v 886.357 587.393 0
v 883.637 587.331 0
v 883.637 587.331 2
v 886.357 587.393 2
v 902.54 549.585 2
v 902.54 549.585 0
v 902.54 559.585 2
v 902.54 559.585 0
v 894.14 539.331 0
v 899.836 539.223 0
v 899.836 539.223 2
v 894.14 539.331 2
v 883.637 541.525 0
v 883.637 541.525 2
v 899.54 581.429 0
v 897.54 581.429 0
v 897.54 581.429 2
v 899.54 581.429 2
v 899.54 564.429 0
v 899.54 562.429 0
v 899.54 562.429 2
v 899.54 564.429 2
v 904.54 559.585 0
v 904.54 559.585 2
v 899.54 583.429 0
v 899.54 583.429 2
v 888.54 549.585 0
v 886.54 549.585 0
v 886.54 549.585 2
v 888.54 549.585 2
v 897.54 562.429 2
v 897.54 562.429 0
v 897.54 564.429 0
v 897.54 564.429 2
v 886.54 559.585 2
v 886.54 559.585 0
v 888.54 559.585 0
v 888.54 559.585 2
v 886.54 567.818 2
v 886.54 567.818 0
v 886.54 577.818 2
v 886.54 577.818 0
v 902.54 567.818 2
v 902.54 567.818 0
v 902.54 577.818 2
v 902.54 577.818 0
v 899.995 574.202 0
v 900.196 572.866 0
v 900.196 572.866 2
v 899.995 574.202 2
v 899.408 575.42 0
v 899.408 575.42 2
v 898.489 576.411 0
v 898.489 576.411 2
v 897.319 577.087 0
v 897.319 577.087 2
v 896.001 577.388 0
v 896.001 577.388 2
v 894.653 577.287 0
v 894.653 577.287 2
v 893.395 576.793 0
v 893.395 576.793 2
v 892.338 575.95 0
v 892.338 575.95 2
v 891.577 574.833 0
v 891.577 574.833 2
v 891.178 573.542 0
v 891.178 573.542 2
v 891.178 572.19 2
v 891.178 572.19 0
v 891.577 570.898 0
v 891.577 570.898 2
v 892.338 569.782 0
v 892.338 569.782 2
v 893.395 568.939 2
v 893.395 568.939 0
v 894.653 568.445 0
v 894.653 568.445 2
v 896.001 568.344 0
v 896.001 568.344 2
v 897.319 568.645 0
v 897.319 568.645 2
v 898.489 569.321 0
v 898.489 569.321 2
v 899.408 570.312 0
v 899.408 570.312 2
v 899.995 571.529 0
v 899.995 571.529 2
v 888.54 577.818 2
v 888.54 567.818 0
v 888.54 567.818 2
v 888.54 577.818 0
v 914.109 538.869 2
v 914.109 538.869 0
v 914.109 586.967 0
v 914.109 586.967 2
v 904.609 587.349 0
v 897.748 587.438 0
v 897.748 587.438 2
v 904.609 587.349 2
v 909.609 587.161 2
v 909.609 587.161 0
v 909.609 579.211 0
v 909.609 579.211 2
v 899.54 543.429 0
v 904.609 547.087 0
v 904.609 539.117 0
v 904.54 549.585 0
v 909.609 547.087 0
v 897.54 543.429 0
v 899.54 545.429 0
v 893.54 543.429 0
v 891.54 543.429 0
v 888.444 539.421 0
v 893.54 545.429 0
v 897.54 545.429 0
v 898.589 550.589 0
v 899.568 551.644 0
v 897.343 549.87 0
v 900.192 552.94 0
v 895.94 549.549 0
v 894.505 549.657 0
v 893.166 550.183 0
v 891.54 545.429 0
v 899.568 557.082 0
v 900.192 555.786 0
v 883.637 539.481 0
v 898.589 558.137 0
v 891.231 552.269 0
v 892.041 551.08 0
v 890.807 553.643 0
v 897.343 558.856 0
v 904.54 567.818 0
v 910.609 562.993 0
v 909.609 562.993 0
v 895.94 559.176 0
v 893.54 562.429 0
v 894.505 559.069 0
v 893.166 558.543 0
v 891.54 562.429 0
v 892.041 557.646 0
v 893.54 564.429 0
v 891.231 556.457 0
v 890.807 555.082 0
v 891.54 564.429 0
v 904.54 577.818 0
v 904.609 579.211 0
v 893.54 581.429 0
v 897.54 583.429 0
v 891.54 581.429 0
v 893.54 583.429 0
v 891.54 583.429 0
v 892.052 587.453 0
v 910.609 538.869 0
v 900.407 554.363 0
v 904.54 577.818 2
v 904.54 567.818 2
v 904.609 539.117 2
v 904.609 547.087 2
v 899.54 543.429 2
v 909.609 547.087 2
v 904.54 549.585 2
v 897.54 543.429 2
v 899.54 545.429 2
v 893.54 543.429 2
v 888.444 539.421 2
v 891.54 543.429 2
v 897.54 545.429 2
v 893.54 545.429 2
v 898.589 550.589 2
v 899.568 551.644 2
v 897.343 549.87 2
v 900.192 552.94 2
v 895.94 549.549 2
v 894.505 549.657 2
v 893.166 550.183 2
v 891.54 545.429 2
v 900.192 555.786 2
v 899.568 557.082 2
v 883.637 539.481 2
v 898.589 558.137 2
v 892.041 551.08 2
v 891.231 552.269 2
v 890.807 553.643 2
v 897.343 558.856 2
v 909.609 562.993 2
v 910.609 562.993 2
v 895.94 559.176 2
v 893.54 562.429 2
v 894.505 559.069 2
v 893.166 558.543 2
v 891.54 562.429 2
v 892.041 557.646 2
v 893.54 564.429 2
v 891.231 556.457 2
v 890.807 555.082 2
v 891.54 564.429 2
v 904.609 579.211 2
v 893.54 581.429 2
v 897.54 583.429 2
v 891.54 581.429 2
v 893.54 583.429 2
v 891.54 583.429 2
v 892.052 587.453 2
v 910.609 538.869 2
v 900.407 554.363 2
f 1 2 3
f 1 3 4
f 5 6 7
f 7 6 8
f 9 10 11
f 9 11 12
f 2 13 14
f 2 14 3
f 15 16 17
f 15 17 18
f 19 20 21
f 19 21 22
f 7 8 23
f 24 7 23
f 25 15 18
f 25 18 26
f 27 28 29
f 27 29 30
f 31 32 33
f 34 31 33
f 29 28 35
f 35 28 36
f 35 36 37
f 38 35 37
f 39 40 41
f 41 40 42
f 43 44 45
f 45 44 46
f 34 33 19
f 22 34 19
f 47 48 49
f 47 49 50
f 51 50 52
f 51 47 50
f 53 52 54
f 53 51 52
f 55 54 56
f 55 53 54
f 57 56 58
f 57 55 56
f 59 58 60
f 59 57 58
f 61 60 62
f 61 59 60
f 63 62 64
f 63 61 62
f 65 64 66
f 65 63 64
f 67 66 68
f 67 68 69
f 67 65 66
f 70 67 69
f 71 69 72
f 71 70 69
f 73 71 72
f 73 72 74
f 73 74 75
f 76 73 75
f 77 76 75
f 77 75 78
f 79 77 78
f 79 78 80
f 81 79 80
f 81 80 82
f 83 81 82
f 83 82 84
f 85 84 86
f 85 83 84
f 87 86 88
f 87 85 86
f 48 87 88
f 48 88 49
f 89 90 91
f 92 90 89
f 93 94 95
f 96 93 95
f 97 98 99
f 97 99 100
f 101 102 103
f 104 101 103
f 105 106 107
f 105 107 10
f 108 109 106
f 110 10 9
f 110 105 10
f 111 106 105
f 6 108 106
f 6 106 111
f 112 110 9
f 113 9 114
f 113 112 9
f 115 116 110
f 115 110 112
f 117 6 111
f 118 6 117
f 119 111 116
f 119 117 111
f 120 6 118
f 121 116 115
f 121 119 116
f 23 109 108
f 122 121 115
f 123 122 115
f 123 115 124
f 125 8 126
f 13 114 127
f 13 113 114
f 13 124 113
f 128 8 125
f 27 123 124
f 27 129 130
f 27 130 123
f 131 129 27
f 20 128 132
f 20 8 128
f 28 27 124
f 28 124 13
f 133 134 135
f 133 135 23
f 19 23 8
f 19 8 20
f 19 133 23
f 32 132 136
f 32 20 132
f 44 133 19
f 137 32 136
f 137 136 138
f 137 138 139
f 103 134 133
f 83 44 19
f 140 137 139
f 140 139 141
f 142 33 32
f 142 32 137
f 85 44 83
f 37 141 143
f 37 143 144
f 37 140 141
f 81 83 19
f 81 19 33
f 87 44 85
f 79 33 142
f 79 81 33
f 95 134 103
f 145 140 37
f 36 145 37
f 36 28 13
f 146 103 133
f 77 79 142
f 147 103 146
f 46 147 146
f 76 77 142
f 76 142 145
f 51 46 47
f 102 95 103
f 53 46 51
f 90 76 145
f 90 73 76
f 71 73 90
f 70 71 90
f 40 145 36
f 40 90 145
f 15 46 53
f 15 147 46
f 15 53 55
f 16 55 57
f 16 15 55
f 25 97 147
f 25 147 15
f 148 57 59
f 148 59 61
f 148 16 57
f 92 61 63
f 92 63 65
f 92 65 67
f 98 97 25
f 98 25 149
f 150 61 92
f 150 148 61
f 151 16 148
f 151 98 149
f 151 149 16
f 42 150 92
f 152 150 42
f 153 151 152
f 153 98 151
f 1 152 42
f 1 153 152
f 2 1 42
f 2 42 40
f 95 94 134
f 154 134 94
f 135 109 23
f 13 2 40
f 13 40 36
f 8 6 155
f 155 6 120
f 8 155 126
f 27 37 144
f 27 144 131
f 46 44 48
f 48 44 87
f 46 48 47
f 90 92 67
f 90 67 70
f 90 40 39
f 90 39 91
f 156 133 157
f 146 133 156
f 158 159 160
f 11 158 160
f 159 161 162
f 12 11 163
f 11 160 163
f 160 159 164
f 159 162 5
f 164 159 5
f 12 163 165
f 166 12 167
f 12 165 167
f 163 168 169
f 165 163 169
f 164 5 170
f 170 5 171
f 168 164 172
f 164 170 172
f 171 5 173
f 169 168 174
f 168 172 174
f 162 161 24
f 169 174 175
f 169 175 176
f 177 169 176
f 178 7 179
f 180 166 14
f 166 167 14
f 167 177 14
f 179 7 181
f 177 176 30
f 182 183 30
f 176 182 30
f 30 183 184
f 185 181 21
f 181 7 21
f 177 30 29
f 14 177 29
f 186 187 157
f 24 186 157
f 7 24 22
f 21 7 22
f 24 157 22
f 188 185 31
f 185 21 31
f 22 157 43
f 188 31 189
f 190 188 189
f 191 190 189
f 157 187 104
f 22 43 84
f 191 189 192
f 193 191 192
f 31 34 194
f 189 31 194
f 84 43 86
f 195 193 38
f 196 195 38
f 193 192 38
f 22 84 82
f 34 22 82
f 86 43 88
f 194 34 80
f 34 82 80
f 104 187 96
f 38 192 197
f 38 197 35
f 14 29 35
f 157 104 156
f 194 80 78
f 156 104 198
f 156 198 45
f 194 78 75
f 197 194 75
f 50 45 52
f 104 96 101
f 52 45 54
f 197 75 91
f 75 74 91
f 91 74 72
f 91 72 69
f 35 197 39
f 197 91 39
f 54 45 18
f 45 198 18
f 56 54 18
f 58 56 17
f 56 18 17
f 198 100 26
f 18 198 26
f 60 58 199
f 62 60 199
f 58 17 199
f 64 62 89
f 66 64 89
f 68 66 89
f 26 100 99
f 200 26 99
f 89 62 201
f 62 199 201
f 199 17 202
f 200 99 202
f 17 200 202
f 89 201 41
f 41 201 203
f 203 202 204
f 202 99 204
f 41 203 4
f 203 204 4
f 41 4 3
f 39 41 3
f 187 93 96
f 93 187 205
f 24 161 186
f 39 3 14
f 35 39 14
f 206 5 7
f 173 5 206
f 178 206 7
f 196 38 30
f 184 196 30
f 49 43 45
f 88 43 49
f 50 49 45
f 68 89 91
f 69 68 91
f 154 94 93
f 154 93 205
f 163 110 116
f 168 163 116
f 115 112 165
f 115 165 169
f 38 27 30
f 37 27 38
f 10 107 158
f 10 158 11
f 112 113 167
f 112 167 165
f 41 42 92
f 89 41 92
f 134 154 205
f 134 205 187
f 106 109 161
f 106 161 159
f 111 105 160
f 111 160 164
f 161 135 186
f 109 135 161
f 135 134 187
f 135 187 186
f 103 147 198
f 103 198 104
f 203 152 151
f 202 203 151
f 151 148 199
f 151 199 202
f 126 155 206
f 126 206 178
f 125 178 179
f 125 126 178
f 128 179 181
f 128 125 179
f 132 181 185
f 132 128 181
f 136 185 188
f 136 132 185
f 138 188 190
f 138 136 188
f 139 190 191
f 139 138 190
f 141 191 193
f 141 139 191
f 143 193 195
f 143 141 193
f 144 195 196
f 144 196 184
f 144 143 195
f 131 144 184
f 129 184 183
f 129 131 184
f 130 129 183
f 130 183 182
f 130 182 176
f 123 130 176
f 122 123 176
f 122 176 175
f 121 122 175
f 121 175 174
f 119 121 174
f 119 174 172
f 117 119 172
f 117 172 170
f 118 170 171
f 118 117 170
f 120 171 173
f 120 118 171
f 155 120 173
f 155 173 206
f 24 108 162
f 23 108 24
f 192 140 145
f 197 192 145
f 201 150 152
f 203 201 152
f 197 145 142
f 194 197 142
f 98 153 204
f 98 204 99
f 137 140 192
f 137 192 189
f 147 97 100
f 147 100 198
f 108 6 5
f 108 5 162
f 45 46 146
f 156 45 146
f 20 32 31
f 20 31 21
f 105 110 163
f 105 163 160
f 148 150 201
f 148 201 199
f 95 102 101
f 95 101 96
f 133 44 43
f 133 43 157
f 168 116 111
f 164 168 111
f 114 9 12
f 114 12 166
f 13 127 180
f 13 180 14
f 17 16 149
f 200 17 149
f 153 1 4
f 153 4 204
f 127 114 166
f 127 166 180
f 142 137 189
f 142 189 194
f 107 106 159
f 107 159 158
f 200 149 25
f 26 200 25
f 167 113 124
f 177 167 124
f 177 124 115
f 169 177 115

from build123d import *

# Parameters (mm, degrees)
MODEL_R         = 4.534410691
MODEL_R_2       = 4.826928656
MODEL_W         = 2
MODEL_H         = 10
MODEL_H_2       = 2
EXTRUDE_1_DEPTH = 2


with BuildPart() as part:
    # Model → 凸台-拉伸1 (new body)
    with BuildSketch(Plane.XY):
        Polygon((883.637204973, 587.330530622), (886.356553012, 587.393355998), (892.052378601, 587.452861056), (897.748434881, 587.438305688), (904.608822678, 587.348603606), (904.608822678, 579.211202345), (909.608822678, 579.211202345), (909.608822678, 580.211202345), (909.608822678, 587.161390594), (914.108822678, 586.966954635), (914.108822678, 579.859457913), (914.108822678, 538.869007346), (910.608822678, 538.869007346), (910.608822678, 562.993038329), (909.608822678, 562.993038329), (909.608822678, 547.086608467), (904.608822678, 547.086608467), (904.608822678, 539.117249216), (899.835523647, 539.223453365), (894.140406006, 539.331138315), (888.444075417, 539.420753158), (883.636881049, 539.481070293), (883.637204973, 541.525037946), align=None)
        with Locations((895.661921161, 572.865848158)):
            Circle(MODEL_R, mode=Mode.SUBTRACT)
        with Locations((895.579584436, 554.362843803)):
            Circle(MODEL_R_2, mode=Mode.SUBTRACT)
        with Locations((887.540358452, 554.584784532)):
            Rectangle(MODEL_W, MODEL_H, mode=Mode.SUBTRACT)
        with Locations((887.540358452, 572.817915241)):
            Rectangle(MODEL_W, MODEL_H, mode=Mode.SUBTRACT)
        with Locations((903.540358452, 572.817915241)):
            Rectangle(MODEL_W, MODEL_H, mode=Mode.SUBTRACT)
        with Locations((903.540358452, 554.584784532)):
            Rectangle(MODEL_W, MODEL_H, mode=Mode.SUBTRACT)
        with Locations((898.540358452, 544.428876798)):
            Rectangle(MODEL_W, MODEL_H_2, mode=Mode.SUBTRACT)
        with Locations((892.540358452, 544.428876798)):
            Rectangle(MODEL_W, MODEL_H_2, mode=Mode.SUBTRACT)
        with Locations((898.540358452, 563.428876798)):
            Rectangle(MODEL_W, MODEL_H_2, mode=Mode.SUBTRACT)
        with Locations((892.540358452, 563.428876798)):
            Rectangle(MODEL_W, MODEL_H_2, mode=Mode.SUBTRACT)
        with Locations((898.540358452, 582.428876798)):
            Rectangle(MODEL_W, MODEL_H_2, mode=Mode.SUBTRACT)
        with Locations((892.540358452, 582.428876798)):
            Rectangle(MODEL_W, MODEL_H_2, mode=Mode.SUBTRACT)
    extrude(amount=EXTRUDE_1_DEPTH)


solid = part.part
